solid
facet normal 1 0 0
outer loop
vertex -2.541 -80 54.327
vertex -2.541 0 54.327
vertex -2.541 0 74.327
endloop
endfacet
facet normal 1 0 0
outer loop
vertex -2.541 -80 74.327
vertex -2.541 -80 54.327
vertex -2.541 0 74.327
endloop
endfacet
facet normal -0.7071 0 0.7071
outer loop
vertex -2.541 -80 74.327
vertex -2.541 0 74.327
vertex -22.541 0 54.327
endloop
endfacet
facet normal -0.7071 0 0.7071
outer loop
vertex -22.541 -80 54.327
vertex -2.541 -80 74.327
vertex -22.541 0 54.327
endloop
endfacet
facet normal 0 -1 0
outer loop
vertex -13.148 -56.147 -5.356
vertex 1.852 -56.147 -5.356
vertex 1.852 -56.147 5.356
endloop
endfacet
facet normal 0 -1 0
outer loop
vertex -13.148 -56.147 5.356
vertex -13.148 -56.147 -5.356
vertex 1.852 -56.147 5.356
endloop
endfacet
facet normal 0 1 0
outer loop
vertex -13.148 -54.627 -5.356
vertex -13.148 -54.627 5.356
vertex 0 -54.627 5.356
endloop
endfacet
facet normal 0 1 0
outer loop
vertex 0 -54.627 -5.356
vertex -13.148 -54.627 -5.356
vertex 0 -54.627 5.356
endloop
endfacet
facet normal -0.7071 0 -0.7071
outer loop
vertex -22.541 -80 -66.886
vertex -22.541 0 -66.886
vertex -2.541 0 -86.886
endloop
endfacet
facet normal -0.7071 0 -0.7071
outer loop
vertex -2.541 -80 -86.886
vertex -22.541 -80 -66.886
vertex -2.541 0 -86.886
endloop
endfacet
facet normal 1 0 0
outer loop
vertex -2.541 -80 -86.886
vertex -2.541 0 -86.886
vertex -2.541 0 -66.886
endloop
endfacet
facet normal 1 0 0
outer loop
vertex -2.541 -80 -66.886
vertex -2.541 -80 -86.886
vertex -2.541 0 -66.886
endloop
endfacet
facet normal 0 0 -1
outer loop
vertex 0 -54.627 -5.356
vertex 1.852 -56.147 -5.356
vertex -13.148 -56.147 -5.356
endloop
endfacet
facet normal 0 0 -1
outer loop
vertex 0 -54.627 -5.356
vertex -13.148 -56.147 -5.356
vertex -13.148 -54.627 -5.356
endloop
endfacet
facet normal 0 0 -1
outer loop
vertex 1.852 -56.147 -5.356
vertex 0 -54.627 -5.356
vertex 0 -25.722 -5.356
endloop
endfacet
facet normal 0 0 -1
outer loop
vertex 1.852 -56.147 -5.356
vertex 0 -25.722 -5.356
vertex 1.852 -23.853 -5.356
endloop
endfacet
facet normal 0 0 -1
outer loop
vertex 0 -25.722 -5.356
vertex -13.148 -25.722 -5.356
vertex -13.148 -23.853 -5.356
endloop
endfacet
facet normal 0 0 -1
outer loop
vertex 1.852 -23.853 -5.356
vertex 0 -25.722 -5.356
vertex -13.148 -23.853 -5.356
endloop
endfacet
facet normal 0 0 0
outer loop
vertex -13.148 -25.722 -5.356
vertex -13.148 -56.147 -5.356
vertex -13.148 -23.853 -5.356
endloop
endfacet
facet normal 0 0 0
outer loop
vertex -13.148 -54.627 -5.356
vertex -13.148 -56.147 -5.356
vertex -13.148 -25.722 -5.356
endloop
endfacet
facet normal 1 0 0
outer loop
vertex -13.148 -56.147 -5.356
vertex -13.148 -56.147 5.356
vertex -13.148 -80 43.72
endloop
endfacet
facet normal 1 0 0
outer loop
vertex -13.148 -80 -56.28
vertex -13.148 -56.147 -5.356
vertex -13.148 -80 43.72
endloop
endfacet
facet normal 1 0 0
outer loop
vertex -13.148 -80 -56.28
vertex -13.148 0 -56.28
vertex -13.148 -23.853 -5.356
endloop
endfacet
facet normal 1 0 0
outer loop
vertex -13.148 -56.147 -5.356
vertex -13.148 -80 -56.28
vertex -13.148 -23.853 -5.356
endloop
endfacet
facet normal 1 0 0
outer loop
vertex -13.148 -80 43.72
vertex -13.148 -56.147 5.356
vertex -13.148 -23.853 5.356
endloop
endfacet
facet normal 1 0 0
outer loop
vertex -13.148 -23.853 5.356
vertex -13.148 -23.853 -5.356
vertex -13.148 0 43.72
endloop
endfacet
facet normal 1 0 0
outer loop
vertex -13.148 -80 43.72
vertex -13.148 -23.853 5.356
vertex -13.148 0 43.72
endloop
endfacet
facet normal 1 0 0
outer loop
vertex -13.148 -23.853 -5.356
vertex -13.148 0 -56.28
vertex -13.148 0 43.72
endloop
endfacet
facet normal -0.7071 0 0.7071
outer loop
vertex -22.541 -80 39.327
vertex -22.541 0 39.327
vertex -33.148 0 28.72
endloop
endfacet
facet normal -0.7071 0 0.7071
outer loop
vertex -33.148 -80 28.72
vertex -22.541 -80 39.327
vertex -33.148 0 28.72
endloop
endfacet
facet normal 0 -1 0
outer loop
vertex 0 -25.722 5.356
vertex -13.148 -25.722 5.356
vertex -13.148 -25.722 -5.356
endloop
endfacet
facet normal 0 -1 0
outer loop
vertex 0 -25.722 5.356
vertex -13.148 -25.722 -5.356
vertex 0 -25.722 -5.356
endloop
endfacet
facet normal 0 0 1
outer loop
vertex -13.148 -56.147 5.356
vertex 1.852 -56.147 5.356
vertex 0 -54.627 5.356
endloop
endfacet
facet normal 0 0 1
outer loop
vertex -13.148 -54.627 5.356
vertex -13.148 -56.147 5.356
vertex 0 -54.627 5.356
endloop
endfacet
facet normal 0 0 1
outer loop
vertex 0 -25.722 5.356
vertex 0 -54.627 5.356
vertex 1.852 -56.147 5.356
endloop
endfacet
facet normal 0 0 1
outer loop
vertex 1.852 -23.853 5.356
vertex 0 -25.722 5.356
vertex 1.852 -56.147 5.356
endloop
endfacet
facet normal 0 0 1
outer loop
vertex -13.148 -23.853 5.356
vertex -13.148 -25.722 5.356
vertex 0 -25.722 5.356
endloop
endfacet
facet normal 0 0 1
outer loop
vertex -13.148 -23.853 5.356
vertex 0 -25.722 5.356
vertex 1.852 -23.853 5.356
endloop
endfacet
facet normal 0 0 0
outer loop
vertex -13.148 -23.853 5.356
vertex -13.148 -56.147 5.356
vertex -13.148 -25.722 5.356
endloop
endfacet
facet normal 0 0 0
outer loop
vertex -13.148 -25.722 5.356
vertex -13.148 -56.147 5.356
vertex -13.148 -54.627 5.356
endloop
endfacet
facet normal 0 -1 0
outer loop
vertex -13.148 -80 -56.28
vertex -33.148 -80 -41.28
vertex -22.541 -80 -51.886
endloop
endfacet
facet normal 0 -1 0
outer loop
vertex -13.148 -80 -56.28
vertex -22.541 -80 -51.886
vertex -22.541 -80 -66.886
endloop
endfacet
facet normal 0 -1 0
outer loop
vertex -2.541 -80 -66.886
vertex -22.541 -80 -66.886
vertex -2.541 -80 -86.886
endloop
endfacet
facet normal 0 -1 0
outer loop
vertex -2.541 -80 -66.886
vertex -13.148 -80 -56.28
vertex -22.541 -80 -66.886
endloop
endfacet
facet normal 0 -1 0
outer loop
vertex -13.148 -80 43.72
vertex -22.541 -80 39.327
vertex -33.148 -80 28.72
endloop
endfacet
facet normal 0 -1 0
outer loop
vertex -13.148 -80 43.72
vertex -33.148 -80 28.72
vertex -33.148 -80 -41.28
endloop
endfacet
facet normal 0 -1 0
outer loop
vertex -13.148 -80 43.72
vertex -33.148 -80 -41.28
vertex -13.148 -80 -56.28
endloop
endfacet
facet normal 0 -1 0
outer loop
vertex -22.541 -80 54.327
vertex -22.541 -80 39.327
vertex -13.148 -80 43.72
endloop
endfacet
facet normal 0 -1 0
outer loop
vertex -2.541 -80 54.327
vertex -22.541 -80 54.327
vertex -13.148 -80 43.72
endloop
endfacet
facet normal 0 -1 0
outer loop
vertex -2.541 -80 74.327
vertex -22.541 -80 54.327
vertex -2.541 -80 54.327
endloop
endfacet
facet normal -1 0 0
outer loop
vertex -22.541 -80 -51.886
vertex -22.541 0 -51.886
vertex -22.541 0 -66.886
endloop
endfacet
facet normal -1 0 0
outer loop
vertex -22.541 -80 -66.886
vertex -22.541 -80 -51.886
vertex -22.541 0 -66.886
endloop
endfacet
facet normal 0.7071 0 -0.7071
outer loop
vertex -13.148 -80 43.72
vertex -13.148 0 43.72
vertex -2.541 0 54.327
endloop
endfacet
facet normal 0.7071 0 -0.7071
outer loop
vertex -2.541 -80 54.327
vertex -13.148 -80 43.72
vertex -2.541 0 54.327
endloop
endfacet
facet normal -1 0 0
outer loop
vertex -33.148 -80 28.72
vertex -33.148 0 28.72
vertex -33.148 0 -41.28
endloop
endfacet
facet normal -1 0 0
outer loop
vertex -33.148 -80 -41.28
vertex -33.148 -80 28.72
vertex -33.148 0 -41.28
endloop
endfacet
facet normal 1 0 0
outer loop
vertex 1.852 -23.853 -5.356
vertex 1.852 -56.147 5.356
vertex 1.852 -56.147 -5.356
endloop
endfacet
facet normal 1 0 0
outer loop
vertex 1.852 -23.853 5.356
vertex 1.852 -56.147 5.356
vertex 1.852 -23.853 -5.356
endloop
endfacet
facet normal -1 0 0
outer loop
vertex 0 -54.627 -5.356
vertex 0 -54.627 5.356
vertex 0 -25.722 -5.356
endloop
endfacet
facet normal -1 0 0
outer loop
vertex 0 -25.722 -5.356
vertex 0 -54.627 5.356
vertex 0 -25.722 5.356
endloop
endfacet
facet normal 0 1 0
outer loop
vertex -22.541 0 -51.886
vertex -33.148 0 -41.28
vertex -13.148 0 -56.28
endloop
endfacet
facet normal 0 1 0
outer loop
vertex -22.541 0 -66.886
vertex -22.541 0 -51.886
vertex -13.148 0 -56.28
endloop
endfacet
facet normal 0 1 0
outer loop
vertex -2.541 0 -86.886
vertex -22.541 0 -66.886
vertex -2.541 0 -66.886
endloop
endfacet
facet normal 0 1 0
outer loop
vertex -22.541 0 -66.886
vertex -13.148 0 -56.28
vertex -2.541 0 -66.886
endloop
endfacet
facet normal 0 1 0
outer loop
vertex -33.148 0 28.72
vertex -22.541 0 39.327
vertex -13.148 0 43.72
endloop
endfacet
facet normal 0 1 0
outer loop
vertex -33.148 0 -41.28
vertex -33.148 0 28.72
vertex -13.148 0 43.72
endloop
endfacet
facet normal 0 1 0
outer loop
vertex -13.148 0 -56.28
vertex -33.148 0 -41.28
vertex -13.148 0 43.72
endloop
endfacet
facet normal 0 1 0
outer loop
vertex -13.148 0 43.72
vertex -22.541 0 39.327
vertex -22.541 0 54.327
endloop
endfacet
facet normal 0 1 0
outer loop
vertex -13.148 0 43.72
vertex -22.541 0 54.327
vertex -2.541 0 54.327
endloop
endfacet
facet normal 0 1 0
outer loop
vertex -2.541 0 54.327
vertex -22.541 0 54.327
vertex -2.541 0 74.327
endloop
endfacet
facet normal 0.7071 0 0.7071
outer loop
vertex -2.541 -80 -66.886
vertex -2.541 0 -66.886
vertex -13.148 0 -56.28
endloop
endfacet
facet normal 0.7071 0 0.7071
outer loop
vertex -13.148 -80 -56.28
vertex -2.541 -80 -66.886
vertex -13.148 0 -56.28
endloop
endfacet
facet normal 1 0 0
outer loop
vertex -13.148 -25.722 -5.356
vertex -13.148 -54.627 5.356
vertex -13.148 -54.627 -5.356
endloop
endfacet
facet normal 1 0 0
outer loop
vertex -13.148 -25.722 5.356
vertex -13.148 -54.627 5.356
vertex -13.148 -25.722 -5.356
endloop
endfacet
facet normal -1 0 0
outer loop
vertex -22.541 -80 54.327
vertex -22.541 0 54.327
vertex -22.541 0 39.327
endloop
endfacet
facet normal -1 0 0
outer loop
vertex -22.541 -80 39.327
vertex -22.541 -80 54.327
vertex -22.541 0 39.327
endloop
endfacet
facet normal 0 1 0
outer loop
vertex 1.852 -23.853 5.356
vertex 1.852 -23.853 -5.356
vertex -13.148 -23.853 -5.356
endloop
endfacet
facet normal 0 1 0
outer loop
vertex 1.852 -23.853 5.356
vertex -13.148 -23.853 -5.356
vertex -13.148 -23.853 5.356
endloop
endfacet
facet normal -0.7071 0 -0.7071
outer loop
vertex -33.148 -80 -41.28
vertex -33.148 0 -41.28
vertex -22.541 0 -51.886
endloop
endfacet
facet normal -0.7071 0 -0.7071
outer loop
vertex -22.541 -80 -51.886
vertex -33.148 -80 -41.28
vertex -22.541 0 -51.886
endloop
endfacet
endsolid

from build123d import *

# Parameters (mm, degrees)
F1_DEPTH = 80
F2_W     = 32.294086
F2_H     = 10.712334
F3_DEPTH = 15
F4_W     = 13.147677
F4_H     = 28.905093
F5_DEPTH = 25


with BuildPart() as f1:
    # F0 (on Front) → F1 (new body)
    with BuildSketch(Plane.XZ):
        Polygon((-22.541075, 39.326958), (-33.147677, 28.720356), (-33.147677, -41.279644), (-22.541075, -51.886245), (-22.541075, -66.886245), (-2.541075, -86.886245), (-2.541075, -66.886245), (-13.147677, -56.279644), (-13.147677, 43.720356), (-2.541075, 54.326958), (-2.541075, 74.326958), (-22.541075, 54.326958), align=None)
    extrude(amount=F1_DEPTH)

    # F2 (on face) → F3 (join)
    with BuildSketch(Plane.YZ.offset(-13.147677)):
        with Locations((-40, 0)):
            Rectangle(F2_W, F2_H)
    extrude(amount=F3_DEPTH)

    # F4 (on face) → F5 (cut)
    with BuildSketch(Plane.XY.offset(5.356167)):
        with Locations((-6.573838, -40.174481)):
            Rectangle(F4_W, F4_H)
    extrude(amount=-F5_DEPTH, mode=Mode.SUBTRACT)


solid = f1.part
